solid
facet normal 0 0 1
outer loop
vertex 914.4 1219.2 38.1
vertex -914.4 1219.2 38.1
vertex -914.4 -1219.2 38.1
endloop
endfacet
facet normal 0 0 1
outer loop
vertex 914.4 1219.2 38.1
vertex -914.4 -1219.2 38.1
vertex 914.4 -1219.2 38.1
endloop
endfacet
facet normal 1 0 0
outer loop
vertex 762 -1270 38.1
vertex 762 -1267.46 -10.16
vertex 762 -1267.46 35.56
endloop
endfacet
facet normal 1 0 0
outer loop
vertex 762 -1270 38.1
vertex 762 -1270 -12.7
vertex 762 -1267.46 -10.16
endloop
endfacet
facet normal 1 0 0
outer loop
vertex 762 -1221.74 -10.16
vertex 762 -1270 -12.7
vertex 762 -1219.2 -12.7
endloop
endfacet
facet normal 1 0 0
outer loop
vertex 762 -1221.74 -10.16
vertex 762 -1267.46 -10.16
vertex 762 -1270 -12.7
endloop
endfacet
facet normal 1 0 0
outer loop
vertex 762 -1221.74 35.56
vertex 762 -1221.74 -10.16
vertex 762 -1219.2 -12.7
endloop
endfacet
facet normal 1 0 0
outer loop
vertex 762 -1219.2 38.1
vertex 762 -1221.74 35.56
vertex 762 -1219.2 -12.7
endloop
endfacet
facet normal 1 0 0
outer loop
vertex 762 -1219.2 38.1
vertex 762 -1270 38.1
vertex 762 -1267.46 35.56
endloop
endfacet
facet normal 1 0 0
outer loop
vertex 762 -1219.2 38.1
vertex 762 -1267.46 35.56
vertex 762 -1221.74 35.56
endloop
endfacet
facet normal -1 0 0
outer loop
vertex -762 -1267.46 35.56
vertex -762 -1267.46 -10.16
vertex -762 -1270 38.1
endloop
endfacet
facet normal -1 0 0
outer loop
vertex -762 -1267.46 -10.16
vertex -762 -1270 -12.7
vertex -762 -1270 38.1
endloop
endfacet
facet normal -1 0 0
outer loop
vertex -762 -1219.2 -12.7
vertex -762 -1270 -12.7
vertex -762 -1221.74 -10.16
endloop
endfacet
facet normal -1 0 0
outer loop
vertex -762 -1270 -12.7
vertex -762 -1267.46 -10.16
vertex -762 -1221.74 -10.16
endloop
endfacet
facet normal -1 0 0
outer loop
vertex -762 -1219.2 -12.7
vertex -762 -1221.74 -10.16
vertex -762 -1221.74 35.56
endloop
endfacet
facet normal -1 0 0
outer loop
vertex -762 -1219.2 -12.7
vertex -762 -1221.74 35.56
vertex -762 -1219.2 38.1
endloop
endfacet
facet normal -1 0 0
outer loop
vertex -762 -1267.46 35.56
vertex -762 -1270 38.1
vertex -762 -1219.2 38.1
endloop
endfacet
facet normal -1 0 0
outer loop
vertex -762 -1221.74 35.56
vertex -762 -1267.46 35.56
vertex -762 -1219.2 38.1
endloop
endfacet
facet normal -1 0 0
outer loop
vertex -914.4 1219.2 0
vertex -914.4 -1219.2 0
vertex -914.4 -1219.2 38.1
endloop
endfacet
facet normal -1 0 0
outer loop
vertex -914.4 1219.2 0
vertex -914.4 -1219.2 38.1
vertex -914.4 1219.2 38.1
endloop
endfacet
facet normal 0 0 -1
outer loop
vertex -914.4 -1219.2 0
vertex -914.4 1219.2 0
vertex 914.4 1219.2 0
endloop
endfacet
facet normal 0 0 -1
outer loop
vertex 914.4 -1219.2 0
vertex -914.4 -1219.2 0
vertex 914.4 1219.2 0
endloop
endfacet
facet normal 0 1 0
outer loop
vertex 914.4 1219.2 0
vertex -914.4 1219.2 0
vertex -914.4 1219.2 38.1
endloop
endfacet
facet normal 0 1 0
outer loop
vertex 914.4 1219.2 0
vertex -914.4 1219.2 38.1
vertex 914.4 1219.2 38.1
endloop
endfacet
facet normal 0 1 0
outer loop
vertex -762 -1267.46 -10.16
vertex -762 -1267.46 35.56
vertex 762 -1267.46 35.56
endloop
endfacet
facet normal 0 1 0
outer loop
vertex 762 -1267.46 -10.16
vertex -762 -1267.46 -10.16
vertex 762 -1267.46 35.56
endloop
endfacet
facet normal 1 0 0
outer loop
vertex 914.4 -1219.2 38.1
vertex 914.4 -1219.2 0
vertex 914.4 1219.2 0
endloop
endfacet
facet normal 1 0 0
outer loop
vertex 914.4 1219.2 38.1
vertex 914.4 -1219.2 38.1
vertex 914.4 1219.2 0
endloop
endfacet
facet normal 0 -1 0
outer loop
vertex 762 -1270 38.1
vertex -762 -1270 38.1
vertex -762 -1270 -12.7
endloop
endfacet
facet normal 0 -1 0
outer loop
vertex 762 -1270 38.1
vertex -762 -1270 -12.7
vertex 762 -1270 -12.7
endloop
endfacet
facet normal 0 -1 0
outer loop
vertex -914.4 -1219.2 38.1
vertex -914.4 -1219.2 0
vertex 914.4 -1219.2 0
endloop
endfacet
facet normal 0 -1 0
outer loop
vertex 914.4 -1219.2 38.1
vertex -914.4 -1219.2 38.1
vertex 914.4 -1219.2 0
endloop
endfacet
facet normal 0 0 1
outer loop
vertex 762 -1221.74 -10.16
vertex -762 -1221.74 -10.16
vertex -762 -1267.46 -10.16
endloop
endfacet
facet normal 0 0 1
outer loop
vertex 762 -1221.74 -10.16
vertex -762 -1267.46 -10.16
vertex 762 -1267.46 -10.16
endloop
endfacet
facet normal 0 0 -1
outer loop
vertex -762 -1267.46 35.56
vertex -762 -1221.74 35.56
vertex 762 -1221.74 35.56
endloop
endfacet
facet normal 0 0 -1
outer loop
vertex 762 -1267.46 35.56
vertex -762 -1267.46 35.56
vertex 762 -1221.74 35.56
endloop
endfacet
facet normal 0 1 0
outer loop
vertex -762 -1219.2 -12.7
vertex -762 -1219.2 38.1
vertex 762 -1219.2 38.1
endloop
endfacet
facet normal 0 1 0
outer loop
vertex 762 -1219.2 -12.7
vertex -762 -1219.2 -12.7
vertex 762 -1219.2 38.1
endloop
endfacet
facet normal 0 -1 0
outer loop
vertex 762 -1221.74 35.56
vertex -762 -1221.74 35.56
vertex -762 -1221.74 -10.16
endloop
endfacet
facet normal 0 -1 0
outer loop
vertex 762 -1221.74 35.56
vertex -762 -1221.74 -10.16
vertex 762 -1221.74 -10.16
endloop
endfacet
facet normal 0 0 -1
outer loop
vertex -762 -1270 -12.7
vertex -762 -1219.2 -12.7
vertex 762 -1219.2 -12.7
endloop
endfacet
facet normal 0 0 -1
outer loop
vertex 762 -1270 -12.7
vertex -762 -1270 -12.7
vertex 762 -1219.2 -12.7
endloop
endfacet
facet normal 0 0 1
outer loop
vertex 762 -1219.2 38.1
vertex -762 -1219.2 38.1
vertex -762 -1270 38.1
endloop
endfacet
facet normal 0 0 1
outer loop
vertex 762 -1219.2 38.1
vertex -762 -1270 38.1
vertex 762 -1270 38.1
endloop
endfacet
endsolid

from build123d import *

# Parameters (mm, degrees)
F0_W     = 1828.8
F0_H     = 2438.4
F1_DEPTH = 38.1
F2_W     = 1524
F2_H     = 50.8
F3_DEPTH = 50.8
F4_T     = -2.54


with BuildPart() as f1:
    # F0 (on Top) → F1 (new body)
    with BuildSketch(Plane.XY):
        Rectangle(F0_W, F0_H)
    extrude(amount=F1_DEPTH)


with BuildPart() as f3:
    # F2 (on face) → F3 (new body)
    with BuildSketch(Plane.XY.offset(38.1)):
        with Locations((0, -1244.6)):
            Rectangle(F2_W, F2_H)
    extrude(amount=-F3_DEPTH)

    # F4
    f4_openings = [f3.faces().sort_by_distance(p)[0] for p in [
        (762, -1244.6, 12.7),
        (-762, -1244.6, 12.7),
    ]]
    offset(amount=F4_T, openings=f4_openings)


solid = Compound([f1.part, f3.part])
